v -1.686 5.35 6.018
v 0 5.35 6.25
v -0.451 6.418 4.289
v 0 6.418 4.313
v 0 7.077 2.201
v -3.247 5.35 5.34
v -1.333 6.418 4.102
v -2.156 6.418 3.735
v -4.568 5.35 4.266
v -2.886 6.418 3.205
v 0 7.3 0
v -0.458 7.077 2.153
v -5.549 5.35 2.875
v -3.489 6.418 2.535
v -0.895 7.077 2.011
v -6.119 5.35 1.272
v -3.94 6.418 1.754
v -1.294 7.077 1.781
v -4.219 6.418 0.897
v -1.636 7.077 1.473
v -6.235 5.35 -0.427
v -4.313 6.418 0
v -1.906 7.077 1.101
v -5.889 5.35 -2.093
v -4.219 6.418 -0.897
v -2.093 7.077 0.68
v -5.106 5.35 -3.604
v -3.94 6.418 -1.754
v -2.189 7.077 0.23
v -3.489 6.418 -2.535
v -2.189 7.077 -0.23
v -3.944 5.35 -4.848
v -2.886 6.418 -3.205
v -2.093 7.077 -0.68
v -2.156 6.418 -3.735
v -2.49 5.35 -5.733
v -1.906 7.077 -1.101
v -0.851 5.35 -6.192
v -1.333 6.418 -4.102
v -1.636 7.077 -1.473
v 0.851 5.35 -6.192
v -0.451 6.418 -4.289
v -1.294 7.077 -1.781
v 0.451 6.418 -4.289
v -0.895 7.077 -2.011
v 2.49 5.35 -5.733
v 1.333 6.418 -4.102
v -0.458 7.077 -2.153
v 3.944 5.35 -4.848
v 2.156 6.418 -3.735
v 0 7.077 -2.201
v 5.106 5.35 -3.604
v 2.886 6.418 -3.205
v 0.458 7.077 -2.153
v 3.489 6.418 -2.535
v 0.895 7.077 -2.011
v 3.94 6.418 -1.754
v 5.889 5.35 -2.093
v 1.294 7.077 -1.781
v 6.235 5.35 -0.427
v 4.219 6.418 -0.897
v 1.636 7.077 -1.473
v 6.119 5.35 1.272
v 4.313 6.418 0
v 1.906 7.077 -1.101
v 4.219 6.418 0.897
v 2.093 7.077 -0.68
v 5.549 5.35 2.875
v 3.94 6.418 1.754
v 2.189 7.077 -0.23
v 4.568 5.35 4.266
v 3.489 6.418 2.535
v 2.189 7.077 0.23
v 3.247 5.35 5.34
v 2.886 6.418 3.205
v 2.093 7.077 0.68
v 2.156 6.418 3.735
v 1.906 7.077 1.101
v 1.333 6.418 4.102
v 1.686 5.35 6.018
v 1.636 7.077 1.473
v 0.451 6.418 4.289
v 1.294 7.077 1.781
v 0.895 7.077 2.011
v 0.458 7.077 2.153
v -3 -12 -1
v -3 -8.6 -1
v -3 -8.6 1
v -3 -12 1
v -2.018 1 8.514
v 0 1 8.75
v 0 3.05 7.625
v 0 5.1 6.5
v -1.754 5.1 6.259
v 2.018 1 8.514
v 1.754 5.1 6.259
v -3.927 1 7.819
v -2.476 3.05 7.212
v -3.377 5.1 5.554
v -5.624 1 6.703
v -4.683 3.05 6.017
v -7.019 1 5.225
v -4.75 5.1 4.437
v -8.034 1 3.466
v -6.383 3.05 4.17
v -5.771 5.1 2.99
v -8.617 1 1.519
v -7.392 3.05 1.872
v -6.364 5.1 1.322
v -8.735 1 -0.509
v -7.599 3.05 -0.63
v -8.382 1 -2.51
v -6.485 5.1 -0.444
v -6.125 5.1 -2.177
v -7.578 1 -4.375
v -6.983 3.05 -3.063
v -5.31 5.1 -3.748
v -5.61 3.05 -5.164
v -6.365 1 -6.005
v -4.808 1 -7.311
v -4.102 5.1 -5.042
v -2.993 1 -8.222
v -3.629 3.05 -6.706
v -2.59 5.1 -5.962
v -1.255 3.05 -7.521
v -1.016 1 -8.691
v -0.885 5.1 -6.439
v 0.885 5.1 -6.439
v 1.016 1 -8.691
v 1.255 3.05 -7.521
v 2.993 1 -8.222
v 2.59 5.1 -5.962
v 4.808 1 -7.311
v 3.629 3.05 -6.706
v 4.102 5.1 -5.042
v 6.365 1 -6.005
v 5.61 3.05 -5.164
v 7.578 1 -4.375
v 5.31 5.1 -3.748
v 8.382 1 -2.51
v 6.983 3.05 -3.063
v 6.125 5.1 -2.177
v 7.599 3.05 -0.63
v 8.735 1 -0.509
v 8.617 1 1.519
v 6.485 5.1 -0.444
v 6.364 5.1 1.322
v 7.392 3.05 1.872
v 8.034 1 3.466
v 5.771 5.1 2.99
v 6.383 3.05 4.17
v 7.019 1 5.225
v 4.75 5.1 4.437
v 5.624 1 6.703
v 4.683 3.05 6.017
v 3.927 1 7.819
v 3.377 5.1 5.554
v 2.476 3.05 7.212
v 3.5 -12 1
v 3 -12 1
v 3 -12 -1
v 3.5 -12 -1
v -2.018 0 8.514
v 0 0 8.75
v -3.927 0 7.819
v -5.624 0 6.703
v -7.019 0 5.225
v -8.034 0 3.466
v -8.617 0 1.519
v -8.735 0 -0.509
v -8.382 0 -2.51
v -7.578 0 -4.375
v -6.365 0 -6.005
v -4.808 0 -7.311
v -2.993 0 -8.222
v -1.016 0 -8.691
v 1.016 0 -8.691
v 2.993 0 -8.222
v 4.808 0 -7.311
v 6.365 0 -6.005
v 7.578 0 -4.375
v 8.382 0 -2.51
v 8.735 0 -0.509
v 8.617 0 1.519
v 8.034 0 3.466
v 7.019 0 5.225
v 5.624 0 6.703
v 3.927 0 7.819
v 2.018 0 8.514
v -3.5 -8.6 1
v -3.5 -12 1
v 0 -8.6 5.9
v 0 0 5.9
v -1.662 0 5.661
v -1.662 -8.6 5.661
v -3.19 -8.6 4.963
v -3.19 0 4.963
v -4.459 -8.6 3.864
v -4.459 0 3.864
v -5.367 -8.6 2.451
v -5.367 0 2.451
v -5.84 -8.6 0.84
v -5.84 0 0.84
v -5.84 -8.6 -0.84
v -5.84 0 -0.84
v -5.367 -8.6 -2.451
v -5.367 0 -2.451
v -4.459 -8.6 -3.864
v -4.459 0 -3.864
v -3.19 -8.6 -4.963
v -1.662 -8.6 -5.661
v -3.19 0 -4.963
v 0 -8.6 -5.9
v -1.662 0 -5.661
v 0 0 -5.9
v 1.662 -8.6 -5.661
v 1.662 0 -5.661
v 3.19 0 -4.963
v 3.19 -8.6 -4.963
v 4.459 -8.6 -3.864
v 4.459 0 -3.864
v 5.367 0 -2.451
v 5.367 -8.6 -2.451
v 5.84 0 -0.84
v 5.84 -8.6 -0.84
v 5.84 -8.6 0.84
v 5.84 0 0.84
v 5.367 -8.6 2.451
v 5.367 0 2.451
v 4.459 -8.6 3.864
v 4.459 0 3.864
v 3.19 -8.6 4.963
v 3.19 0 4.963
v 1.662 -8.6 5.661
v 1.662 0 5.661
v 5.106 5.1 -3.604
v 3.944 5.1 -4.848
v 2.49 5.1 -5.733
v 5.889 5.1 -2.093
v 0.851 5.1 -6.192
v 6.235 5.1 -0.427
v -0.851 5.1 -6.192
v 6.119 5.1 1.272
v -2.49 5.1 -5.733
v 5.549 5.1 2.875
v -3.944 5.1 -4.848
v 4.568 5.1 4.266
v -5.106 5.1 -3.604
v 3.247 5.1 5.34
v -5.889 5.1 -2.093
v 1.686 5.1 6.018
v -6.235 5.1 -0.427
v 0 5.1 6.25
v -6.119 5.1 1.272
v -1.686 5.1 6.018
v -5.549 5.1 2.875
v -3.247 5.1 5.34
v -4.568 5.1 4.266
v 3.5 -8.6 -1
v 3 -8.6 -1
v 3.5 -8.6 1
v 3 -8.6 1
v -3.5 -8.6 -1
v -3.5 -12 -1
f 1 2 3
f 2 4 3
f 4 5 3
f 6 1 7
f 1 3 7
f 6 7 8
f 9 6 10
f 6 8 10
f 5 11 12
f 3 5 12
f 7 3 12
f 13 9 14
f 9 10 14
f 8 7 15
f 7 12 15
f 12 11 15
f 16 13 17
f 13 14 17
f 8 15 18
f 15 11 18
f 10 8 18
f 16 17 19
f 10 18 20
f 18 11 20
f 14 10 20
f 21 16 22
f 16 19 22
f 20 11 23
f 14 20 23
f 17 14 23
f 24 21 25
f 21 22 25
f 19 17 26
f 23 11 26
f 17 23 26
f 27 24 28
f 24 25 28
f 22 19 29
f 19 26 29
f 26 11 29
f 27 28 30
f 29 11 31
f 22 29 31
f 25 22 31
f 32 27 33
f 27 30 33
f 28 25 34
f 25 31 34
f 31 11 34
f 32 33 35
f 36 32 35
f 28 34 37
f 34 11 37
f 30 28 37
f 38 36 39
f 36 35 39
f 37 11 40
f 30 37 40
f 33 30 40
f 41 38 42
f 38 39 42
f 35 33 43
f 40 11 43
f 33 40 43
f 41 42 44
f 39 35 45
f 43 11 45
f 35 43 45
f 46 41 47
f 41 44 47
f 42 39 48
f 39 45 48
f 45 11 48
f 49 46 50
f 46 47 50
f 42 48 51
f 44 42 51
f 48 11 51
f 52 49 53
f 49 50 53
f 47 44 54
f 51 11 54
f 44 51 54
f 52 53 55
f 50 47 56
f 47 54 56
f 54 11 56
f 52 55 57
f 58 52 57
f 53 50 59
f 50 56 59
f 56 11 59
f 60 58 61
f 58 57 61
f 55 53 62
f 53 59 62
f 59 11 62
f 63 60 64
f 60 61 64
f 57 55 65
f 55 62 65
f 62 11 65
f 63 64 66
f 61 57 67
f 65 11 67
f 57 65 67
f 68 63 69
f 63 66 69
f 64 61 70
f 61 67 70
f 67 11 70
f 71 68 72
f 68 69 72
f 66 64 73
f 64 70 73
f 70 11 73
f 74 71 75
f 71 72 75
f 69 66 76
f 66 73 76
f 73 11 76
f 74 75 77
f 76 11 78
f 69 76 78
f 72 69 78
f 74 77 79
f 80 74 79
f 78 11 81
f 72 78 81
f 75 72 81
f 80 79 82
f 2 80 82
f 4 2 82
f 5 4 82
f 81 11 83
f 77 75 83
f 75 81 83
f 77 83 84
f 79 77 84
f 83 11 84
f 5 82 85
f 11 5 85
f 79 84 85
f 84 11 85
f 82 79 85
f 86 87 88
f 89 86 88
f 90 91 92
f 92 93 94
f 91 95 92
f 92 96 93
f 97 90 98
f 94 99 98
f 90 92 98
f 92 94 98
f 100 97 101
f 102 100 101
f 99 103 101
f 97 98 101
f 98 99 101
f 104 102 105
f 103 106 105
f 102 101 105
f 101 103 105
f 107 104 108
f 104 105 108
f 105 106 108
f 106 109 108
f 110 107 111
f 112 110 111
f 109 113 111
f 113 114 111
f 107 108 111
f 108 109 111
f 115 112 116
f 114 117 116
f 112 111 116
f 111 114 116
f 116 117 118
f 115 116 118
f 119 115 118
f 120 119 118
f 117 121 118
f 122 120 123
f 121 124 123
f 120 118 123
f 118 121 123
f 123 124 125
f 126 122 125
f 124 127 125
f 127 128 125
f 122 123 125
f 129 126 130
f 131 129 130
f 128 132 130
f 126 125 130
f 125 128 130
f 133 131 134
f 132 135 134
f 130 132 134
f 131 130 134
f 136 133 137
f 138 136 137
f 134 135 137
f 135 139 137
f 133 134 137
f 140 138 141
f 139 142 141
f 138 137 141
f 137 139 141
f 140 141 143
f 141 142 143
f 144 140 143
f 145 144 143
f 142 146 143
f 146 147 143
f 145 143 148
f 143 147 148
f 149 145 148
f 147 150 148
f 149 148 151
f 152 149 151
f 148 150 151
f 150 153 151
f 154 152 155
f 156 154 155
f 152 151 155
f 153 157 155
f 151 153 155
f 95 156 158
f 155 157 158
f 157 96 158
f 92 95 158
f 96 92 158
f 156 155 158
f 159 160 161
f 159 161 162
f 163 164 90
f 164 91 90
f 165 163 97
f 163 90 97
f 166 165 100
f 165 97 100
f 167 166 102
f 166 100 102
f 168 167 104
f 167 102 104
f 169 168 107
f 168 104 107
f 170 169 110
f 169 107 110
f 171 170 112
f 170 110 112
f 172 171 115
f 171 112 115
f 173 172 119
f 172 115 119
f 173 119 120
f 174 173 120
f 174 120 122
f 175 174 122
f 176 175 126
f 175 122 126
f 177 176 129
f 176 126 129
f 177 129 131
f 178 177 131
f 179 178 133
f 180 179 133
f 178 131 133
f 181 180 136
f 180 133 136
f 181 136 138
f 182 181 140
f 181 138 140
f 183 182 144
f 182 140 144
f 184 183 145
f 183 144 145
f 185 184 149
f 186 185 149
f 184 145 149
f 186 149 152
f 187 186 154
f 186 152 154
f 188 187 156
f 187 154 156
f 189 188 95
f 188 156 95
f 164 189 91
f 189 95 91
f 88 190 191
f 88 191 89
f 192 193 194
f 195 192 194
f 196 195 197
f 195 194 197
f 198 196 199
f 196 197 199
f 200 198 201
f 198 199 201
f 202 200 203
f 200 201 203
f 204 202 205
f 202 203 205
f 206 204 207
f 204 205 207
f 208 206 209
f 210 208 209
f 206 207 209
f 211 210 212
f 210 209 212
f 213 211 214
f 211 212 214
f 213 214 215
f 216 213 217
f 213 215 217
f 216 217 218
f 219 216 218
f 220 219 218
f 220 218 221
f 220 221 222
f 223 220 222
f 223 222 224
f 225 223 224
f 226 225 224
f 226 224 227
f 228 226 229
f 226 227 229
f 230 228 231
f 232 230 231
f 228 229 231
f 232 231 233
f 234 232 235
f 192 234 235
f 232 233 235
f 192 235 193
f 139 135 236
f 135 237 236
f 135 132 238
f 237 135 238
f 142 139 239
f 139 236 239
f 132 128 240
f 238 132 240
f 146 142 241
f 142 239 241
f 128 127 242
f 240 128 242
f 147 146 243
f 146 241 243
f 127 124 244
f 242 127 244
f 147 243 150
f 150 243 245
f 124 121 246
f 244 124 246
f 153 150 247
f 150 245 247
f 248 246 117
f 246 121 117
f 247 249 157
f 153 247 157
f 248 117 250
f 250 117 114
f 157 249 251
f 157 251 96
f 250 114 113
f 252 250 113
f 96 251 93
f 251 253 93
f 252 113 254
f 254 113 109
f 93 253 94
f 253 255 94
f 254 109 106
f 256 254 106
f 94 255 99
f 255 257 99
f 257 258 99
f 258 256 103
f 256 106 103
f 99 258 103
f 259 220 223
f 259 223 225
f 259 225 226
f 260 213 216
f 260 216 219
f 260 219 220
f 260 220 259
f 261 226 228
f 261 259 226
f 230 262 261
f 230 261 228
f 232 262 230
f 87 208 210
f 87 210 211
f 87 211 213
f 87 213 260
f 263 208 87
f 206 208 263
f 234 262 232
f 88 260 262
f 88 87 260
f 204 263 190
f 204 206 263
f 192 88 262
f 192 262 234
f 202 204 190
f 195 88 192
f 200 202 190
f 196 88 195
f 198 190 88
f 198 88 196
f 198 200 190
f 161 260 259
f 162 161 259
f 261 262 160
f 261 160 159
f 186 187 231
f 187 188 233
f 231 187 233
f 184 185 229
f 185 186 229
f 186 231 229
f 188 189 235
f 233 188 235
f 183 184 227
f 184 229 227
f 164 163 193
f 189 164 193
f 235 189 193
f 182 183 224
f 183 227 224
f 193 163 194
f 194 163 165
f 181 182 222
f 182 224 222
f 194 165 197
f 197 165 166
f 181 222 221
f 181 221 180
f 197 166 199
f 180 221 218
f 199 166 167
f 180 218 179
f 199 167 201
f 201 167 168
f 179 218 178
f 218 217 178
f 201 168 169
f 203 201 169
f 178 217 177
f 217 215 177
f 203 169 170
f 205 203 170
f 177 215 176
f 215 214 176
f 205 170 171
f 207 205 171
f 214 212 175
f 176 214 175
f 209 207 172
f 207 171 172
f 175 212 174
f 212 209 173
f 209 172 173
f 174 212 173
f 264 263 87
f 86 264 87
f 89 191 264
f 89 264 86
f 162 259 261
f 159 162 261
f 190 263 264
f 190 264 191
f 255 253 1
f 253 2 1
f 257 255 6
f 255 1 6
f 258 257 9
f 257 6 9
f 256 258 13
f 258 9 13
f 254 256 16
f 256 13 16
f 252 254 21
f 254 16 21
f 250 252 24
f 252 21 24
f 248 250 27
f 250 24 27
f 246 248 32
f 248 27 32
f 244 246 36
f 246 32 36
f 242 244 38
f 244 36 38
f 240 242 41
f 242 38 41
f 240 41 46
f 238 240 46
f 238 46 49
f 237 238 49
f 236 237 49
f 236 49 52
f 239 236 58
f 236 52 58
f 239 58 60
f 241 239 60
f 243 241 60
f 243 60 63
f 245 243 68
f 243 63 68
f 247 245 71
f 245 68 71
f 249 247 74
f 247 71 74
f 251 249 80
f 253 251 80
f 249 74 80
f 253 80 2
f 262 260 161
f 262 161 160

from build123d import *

# Parameters (mm, degrees)
SKETCH2_R           = 5.9
BOSS_EXTRUDE1_DEPTH = 8.6
SKETCH3_W           = 0.5
SKETCH3_H           = 2
BOSS_EXTRUDE2_DEPTH = 3.4


with BuildPart() as part:
    # Sketch1 → Revolve1 (revolve)
    with BuildSketch(Plane.XY, mode=Mode.PRIVATE) as revolve1_sk:
        with BuildLine():
            Line((0, 0), (-8.75, 0))
            Line((-8.75, 0), (-8.75, 1))
            Line((-8.75, 1), (-6.5, 5.1))
            Line((-6.5, 5.1), (-6.25, 5.1))
            Line((-6.25, 5.1), (-6.25, 5.35))
            ThreePointArc((-6.25, 5.35), (-3.273568389, 6.801180735), (0, 7.3))
            Line((0, 7.3), (0, 0))
        make_face()
    revolve(revolve1_sk.sketch.rotate(Axis((0, 7.3, 0), (0, -1, 0)), 270), axis=Axis((0, 7.3, 0), (0, -1, 0)))

    # Sketch2 → Boss-Extrude1 (add)
    with BuildSketch(Plane.XZ):
        with Locations(Location((0, 0, 0), (0, 0, 90))):
            Circle(SKETCH2_R)
    extrude(amount=BOSS_EXTRUDE1_DEPTH)

    # Sketch3 → Boss-Extrude2 (add)
    with BuildSketch(Plane.XZ.offset(8.6)):
        with Locations((-3.25, 0)):
            Rectangle(SKETCH3_W, SKETCH3_H)
        with Locations((3.25, 0)):
            Rectangle(SKETCH3_W, SKETCH3_H)
    extrude(amount=BOSS_EXTRUDE2_DEPTH)


solid = part.part
